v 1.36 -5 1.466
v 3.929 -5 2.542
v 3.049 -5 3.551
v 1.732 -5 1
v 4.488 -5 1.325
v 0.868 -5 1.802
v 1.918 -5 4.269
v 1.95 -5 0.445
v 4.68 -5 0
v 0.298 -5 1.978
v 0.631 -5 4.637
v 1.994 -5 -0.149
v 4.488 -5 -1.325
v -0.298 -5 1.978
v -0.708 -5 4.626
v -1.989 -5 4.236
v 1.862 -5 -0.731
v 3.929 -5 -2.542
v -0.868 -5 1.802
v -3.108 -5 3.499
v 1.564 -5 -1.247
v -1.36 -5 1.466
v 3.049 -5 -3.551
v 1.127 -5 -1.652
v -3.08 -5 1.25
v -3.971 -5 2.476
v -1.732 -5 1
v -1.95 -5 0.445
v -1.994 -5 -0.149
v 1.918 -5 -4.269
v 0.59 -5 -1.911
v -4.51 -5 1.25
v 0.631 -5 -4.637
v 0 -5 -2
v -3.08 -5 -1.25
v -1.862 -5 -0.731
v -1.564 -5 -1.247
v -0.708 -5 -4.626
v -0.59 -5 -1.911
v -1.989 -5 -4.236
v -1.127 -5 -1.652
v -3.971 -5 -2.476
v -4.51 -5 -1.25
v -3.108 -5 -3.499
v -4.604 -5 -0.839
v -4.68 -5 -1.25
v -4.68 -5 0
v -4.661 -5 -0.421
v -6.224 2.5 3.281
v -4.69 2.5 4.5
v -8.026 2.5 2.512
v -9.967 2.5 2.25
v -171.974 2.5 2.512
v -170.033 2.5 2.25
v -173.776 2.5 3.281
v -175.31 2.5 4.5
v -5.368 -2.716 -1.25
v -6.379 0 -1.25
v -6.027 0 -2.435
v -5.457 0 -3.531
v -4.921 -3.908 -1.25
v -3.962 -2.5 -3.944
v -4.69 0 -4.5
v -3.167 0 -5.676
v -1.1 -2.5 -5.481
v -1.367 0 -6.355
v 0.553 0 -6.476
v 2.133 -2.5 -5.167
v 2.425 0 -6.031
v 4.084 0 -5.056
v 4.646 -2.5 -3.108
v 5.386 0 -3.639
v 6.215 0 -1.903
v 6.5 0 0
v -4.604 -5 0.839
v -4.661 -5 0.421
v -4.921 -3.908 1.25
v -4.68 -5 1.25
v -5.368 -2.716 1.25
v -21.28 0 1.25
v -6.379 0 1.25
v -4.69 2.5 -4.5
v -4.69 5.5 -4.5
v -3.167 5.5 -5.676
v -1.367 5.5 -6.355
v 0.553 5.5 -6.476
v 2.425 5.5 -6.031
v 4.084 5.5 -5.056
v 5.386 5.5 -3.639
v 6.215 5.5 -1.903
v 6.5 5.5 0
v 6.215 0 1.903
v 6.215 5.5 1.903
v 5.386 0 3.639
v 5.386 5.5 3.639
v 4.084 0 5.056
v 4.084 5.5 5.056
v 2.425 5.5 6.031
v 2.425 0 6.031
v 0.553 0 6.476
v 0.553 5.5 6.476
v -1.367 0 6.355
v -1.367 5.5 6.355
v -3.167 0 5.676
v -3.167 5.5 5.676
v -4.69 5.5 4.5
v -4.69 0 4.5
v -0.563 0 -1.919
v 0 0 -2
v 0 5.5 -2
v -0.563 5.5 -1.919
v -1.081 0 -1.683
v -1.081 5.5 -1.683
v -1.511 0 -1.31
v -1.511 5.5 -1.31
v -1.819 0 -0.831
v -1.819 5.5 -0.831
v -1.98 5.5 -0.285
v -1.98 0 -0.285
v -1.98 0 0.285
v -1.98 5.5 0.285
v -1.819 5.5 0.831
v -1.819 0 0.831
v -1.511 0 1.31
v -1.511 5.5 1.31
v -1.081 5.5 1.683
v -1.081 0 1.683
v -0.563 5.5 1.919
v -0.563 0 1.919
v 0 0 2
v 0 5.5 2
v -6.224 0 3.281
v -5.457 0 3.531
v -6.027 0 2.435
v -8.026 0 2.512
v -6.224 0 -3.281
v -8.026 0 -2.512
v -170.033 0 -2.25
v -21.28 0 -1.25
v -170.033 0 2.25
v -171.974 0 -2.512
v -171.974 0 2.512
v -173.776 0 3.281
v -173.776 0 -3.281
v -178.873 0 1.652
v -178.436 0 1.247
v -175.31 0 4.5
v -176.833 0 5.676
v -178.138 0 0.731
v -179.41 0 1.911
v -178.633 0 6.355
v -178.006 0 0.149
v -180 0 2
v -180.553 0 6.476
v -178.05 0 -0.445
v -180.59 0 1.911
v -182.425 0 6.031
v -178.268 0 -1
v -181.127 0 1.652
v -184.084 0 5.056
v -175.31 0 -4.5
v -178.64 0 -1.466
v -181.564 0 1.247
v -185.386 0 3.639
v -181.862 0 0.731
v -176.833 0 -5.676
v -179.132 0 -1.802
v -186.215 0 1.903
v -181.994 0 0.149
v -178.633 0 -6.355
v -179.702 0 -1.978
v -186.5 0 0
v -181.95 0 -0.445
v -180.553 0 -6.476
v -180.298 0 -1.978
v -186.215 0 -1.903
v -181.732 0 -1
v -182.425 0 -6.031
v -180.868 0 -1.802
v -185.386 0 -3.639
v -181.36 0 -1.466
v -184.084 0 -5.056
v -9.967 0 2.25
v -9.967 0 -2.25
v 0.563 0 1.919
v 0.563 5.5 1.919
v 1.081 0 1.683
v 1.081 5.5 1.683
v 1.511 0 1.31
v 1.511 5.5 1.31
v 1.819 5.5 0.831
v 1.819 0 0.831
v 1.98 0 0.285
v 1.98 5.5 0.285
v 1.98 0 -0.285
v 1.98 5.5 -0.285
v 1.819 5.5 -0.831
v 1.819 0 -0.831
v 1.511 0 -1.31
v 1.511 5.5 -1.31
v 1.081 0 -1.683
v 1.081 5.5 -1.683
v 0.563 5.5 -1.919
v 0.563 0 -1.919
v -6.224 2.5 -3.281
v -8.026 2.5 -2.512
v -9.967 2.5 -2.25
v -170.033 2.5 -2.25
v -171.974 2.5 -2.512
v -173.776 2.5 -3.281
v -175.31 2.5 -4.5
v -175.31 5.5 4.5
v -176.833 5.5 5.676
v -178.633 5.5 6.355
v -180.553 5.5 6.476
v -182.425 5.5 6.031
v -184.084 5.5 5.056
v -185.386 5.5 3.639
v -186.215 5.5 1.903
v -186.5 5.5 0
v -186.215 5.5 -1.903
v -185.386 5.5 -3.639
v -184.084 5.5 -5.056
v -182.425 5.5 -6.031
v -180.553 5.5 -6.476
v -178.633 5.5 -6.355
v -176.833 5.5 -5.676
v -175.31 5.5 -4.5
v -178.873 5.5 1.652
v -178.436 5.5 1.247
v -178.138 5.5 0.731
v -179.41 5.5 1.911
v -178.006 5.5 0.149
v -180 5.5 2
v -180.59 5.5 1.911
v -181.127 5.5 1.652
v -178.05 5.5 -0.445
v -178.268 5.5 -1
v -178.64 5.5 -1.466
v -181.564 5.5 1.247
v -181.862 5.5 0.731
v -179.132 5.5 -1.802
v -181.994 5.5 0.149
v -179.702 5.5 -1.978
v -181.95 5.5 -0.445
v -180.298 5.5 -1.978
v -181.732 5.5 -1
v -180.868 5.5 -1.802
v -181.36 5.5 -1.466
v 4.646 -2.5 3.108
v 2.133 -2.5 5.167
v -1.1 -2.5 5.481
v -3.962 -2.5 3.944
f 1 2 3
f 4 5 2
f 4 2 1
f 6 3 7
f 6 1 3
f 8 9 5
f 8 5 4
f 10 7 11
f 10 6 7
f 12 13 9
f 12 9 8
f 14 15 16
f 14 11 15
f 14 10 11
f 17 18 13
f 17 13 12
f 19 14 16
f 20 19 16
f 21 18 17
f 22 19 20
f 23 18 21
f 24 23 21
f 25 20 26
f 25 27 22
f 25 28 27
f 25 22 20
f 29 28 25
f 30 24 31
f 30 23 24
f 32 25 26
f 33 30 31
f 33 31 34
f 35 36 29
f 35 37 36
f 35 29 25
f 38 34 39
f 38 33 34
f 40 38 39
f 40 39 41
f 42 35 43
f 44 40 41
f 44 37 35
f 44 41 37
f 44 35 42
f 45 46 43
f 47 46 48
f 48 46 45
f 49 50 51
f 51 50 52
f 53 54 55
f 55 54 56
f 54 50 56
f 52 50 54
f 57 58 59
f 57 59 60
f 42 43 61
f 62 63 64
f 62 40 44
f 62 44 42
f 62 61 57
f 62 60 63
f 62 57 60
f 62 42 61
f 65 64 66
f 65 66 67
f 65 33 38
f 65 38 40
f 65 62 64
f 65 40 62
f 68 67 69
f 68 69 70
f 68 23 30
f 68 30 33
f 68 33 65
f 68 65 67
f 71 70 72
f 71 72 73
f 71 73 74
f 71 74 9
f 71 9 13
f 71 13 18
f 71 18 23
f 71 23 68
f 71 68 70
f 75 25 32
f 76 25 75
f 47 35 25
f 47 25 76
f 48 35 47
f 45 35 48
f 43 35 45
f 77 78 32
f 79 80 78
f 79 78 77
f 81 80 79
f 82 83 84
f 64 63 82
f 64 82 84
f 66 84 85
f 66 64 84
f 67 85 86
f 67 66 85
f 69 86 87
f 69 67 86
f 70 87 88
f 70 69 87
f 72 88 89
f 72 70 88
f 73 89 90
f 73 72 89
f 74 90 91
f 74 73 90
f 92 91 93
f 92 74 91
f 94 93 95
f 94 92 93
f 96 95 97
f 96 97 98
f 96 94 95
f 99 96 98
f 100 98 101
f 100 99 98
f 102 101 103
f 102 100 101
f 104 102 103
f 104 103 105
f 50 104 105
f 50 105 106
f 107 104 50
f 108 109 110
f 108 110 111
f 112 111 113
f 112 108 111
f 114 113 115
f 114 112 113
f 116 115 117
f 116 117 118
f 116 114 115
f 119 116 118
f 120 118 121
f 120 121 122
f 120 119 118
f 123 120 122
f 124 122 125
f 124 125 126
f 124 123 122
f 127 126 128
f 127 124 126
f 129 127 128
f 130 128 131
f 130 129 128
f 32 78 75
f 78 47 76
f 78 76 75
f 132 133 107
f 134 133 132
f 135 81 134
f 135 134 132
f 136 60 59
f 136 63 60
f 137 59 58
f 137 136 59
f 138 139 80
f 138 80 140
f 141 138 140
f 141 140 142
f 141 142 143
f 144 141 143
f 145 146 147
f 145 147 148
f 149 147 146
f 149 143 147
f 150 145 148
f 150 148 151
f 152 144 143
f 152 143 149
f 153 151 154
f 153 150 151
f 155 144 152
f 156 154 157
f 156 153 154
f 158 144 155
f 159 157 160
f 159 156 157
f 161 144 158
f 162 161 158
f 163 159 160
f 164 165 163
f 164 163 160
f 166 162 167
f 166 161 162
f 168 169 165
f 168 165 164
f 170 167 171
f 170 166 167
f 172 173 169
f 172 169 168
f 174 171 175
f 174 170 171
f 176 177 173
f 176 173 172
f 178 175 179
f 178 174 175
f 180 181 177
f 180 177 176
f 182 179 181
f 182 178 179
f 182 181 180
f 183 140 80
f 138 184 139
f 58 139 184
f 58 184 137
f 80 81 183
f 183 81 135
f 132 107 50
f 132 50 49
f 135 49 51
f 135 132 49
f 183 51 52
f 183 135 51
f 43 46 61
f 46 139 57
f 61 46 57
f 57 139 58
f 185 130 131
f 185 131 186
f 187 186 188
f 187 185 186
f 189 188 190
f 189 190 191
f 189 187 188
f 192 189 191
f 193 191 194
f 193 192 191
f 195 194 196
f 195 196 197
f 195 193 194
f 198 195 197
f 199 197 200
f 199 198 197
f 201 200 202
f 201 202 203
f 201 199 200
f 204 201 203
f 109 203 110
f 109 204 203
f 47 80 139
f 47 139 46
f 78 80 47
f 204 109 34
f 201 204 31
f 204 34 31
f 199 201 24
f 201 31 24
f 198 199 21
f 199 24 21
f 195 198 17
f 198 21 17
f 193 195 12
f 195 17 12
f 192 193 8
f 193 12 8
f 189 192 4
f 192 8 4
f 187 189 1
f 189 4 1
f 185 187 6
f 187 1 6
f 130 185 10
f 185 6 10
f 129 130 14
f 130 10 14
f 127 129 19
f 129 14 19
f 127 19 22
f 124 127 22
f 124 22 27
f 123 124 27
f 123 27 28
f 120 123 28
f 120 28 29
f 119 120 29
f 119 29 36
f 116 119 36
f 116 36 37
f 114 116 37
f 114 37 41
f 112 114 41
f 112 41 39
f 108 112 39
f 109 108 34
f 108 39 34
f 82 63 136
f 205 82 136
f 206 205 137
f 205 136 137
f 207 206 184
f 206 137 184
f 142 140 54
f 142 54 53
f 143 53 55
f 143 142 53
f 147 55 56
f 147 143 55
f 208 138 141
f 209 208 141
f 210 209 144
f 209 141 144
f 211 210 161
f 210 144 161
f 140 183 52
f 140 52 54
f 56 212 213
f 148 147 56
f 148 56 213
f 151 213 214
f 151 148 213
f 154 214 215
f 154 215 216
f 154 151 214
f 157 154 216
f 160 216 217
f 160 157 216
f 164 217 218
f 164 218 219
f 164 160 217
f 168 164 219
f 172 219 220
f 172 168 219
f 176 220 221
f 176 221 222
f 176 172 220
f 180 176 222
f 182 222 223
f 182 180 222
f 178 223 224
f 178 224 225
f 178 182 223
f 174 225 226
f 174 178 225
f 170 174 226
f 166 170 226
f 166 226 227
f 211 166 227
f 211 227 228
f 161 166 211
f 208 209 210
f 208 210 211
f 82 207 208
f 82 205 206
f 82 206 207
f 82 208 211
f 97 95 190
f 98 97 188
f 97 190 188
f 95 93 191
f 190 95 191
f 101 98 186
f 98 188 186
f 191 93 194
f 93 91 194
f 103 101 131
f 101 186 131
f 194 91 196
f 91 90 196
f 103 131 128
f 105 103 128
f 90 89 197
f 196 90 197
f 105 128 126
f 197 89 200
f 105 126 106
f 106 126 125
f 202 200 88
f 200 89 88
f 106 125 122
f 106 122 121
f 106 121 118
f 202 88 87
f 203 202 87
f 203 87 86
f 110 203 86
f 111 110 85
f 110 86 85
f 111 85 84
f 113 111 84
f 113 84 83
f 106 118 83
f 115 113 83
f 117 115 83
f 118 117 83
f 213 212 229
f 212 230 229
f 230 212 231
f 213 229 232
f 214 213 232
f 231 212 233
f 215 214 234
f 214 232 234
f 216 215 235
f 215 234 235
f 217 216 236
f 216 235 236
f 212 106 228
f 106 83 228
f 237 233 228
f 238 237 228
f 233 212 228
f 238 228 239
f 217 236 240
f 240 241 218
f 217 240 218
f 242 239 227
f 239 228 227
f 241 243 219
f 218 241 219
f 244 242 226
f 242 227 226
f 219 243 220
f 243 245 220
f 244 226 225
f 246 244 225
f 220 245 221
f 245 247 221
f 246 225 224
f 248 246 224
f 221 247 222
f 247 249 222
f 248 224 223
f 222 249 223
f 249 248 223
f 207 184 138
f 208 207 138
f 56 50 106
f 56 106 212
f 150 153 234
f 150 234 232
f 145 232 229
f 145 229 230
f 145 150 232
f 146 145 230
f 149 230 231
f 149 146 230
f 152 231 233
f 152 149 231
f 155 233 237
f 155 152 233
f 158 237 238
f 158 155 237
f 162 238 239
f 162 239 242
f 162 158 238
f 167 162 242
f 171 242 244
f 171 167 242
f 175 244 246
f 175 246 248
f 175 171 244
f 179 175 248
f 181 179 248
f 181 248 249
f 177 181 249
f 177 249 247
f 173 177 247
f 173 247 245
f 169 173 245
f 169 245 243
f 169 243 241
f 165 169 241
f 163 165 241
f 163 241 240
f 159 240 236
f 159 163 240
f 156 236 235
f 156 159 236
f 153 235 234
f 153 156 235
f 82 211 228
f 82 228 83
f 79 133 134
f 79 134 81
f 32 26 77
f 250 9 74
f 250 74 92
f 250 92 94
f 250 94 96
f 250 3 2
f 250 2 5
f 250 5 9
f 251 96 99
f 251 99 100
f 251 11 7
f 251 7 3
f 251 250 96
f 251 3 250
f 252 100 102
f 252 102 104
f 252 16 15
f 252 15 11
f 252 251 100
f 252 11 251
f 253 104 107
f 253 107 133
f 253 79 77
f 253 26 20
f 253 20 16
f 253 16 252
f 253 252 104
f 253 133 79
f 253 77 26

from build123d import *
from build123d.topology import SkipClean

# Parameters (mm, degrees)
SKETCH1_R           = 2
BOSS_EXTRUDE1_DEPTH = 5.5
CUT_EXTRUDE1_DEPTH  = 2.5
SKETCH4_R           = 6.5
SKETCH3_R           = 4.68
SKETCH5_R           = 2
CUT_EXTRUDE2_DEPTH  = 187.908400029
BOSS_EXTRUDE2_DEPTH = 1.25


with BuildPart() as part:
    # Sketch1 → Boss-Extrude1 (new body)
    with BuildSketch(Plane(origin=(0, 0, 0), x_dir=(1, 0, 0), z_dir=(0, 1, 0))):
        with BuildLine():
            Line((-175.30958424, 4.5), (-4.69041576, 4.5))
            ThreePointArc((-4.69041576, 4.5), (6.5, 0), (-4.69041576, -4.5))
            Line((-4.69041576, -4.5), (-175.30958424, -4.5))
            ThreePointArc((-175.30958424, -4.5), (-186.5, 0), (-175.30958424, 4.5))
        make_face()
        with Locations(Location((0, 0, 0), (0, 0, 270))):
            Circle(SKETCH1_R, mode=Mode.SUBTRACT)
        with Locations(Location((-180, 0, 0), (0, 0, 270))):
            Circle(SKETCH1_R, mode=Mode.SUBTRACT)
    extrude(amount=BOSS_EXTRUDE1_DEPTH)

    # Sketch2 → Cut-Extrude1 (cut)
    with BuildSketch(Plane.XZ):
        with BuildLine():
            Line((-9.96713349, 2.25), (-170.03286651, 2.25))
            ThreePointArc((-170.03286651, 2.25), (-172.901064987, 2.835978332), (-175.30958424, 4.5))
            Line((-175.30958424, 4.5), (-4.69041576, 4.5))
            ThreePointArc((-4.69041576, 4.5), (-7.098935013, 2.835978332), (-9.96713349, 2.25))
        make_face()
        with BuildLine():
            Line((-9.96713349, -2.25), (-170.03286651, -2.25))
            ThreePointArc((-170.03286651, -2.25), (-172.901064987, -2.835978332), (-175.30958424, -4.5))
            Line((-175.30958424, -4.5), (-4.69041576, -4.5))
            ThreePointArc((-4.69041576, -4.5), (-7.098935013, -2.835978332), (-9.96713349, -2.25))
        make_face()
    extrude(amount=-CUT_EXTRUDE1_DEPTH, mode=Mode.SUBTRACT)

    # Sketch4 → Loft1 section 0
    with BuildSketch(Plane.XZ):
        Circle(SKETCH4_R)
    # Sketch3 → Loft1 section 1
    with BuildSketch(Plane(origin=(0, -5, 0), x_dir=(-1, 0, 0), z_dir=(0, -1, 0))):
        Circle(SKETCH3_R)
    loft()

    # Sketch5 → Cut-Extrude2 (cut, through all)
    with SkipClean():  # the faces are left unmerged after this step: merging them gives an invalid solid
        with BuildSketch(Plane.XZ.offset(5)):
            with Locations(Location((0, 0, 0), (0, 0, 270))):
                Circle(SKETCH5_R)
        extrude(amount=-CUT_EXTRUDE2_DEPTH, mode=Mode.SUBTRACT)

    # Sketch6 → Boss-Extrude2 (add, symmetric)
    with SkipClean():  # the faces are left unmerged after this step: merging them gives an invalid solid
        with BuildSketch(Plane.XY):
            Polygon((-3.080000032, 0), (-21.280000032, 0), (-4.680000032, -5), (-3.080000032, -5), align=None)
        extrude(amount=BOSS_EXTRUDE2_DEPTH, both=True)


solid = part.part
